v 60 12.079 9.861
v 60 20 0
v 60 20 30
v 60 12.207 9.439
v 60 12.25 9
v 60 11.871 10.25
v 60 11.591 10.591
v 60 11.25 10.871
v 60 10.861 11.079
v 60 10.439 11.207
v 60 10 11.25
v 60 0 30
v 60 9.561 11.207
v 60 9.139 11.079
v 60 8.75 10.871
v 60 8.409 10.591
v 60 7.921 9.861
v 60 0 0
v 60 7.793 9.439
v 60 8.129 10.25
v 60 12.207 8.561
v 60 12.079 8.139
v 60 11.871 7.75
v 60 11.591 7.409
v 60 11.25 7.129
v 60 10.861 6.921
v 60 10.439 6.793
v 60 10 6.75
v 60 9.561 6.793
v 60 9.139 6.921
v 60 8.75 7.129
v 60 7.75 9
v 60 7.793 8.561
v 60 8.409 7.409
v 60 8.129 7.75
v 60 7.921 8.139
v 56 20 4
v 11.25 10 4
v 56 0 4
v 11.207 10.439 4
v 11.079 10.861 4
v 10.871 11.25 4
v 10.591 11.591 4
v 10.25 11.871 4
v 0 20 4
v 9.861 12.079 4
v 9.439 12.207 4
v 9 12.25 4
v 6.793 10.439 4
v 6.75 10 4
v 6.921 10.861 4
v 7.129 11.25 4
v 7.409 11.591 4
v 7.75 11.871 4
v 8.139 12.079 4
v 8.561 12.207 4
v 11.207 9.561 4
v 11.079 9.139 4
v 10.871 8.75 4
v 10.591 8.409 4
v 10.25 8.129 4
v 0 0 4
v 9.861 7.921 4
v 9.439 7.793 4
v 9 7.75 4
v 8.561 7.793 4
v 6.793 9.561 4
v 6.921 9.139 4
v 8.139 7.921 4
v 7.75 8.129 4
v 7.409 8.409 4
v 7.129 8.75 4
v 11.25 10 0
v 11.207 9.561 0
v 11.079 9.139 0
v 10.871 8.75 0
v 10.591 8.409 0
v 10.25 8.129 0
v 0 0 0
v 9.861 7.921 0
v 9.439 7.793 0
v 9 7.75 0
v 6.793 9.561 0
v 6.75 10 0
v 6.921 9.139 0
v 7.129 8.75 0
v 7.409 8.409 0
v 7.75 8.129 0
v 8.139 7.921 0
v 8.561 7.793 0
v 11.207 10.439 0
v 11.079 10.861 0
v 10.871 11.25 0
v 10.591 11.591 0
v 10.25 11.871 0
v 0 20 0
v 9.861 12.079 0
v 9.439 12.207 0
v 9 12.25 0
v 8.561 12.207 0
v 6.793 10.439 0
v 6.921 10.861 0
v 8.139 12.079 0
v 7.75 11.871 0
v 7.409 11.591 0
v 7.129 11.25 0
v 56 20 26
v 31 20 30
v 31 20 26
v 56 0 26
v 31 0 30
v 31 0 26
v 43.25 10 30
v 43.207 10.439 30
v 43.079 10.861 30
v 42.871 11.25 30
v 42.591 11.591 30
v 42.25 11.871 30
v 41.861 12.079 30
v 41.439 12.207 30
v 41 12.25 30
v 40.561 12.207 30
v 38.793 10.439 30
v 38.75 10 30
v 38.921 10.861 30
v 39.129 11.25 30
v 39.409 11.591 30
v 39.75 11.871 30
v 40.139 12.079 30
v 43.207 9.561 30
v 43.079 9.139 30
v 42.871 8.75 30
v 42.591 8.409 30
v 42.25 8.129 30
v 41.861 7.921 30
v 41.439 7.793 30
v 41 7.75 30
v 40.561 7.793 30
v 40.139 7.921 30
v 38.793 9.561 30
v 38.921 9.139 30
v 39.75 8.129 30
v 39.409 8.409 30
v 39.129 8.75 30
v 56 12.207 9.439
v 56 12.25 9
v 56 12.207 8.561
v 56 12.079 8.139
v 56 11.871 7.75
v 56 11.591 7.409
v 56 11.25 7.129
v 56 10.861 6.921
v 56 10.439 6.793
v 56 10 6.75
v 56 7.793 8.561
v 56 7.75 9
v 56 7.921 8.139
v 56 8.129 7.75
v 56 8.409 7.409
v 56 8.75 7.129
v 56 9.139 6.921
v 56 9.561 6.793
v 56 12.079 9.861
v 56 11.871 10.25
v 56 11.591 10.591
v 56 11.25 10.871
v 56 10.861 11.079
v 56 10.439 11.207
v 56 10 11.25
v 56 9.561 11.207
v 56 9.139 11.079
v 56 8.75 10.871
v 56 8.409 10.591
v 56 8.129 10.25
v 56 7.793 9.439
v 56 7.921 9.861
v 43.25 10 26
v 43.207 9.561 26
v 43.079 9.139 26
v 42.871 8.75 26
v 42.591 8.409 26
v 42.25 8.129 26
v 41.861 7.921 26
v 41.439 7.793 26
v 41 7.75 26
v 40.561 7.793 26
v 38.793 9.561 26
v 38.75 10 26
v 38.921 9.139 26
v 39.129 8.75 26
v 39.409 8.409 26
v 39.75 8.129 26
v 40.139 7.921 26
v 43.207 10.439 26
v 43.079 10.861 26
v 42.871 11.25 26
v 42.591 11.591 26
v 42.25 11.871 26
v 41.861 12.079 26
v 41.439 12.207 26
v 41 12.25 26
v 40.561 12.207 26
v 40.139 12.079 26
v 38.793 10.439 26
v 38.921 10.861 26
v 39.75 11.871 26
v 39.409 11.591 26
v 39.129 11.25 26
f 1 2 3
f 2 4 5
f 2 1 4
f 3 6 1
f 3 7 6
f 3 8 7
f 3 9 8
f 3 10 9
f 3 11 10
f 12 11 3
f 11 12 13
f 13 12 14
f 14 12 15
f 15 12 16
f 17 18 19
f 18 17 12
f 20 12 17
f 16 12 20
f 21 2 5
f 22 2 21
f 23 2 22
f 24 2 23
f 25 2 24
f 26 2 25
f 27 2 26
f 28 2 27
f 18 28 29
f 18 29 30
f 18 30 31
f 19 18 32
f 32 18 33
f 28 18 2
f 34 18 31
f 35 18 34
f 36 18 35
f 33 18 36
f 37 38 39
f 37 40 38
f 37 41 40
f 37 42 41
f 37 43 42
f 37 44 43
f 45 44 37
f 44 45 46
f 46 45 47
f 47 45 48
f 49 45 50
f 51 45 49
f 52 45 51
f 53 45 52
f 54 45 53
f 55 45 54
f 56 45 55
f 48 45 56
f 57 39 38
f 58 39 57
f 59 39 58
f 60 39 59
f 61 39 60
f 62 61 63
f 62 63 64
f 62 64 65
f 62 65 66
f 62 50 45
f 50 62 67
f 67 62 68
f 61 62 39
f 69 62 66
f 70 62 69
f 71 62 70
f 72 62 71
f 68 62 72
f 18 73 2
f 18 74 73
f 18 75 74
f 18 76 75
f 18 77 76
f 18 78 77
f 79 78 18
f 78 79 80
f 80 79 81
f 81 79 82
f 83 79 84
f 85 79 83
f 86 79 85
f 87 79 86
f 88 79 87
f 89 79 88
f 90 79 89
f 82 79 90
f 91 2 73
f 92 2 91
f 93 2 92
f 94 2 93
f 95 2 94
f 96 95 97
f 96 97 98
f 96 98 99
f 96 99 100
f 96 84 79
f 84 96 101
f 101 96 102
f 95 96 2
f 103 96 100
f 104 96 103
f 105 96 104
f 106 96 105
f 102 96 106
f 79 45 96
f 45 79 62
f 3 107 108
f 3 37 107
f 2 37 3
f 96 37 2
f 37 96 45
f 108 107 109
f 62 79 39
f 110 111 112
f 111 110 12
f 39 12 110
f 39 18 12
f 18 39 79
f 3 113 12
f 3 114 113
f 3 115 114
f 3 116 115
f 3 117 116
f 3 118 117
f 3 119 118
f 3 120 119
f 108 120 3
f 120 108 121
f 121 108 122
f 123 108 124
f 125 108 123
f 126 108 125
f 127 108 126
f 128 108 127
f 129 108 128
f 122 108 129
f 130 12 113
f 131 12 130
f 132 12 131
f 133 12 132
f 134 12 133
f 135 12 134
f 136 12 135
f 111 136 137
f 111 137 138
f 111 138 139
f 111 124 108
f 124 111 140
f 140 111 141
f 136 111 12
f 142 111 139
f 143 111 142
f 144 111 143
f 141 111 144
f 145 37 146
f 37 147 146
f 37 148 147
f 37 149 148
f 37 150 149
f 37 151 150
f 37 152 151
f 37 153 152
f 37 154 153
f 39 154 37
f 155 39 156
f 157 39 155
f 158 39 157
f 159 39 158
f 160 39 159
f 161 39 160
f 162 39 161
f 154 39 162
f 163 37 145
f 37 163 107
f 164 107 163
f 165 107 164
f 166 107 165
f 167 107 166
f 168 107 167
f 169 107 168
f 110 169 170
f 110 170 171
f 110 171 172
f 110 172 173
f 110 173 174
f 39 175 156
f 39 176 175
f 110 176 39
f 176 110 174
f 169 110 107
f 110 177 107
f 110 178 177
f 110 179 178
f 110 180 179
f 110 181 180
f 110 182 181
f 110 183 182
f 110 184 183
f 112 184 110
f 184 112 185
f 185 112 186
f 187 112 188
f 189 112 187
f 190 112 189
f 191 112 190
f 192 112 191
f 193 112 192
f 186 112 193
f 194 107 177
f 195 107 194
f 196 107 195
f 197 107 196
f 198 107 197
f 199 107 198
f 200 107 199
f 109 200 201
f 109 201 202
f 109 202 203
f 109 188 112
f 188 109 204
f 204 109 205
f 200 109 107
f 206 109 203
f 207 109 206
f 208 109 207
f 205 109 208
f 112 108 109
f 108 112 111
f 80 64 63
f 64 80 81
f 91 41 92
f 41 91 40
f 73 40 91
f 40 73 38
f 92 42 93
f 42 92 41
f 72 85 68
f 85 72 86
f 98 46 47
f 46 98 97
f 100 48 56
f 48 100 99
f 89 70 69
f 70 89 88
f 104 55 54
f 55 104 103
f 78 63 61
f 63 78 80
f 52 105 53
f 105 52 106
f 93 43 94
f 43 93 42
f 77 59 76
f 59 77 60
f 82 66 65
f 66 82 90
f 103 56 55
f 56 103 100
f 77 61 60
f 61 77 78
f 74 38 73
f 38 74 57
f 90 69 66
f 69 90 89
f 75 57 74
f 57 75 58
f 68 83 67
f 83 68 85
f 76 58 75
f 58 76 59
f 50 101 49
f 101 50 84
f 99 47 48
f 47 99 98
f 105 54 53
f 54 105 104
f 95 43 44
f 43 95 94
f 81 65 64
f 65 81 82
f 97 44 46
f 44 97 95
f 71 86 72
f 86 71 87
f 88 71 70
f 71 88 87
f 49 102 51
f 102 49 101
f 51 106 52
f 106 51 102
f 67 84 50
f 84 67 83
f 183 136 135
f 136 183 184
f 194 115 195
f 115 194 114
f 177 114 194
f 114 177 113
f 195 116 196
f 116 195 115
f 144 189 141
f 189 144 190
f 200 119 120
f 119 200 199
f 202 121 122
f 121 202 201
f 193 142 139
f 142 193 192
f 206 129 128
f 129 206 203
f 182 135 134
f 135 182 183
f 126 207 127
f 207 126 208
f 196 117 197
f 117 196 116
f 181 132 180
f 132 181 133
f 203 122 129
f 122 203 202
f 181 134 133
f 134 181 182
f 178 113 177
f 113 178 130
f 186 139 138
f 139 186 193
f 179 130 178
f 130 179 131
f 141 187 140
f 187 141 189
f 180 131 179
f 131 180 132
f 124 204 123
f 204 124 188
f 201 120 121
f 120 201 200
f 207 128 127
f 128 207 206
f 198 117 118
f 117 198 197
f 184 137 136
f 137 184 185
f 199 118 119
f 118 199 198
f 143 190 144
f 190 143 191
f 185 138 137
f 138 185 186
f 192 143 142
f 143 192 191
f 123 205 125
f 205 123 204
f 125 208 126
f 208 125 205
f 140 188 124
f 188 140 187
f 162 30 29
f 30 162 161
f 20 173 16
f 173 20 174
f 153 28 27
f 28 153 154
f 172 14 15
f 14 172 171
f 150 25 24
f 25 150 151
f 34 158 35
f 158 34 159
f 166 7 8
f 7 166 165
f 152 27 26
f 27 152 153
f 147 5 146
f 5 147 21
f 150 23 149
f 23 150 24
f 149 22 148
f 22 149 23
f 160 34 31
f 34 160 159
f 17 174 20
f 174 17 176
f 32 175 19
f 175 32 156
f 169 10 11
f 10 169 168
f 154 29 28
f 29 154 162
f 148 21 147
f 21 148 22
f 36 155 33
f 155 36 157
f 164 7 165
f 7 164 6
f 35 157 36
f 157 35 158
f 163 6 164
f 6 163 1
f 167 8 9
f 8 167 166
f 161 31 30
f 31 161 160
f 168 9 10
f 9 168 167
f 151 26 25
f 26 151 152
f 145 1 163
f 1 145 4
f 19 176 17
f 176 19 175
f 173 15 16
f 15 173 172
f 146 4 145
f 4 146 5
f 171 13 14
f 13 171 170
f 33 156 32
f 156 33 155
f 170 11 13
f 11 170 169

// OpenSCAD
$fn = 32;

// ----------------------------------------------------------------------
// Z-bracket: 60 x 20 x 30 mm
// ----------------------------------------------------------------------

// --- parameters (mm) ---
lower_len = 60;           // lower foot length, X
upper_len = 25;           // upper foot length, X
width = 20;               // bracket width, Y
rise = 30;                // overall rise, Z
thick = 4;                // plate thickness
hole_d = 4.5;             // clearance for M4

module hole_z(px, py, z0) {
  translate([px, py, z0 - 0.5]) cylinder(h = thick + 1, d = hole_d);
}
module hole_x(py, pz) {
  translate([-0.5, py, pz]) rotate([0, 90, 0]) cylinder(h = thick + 1, d = hole_d);
}

difference() {
  union() {
    cube([lower_len, width, thick]);
    /* web, overlapping the lower foot */
    translate([lower_len - thick, 0, 0]) cube([thick, width, rise]);
    /* upper foot, sunk into the web */
    translate([lower_len - thick - upper_len, 0, rise - thick]) cube([upper_len + thick, width, thick]);
  }
  hole_z(9, 10, 0);
  translate([lower_len - thick - 15, 0, 0]) hole_z(0, 10, rise - thick);
  translate([lower_len - thick, 0, 0]) hole_x(10, 9);
}
